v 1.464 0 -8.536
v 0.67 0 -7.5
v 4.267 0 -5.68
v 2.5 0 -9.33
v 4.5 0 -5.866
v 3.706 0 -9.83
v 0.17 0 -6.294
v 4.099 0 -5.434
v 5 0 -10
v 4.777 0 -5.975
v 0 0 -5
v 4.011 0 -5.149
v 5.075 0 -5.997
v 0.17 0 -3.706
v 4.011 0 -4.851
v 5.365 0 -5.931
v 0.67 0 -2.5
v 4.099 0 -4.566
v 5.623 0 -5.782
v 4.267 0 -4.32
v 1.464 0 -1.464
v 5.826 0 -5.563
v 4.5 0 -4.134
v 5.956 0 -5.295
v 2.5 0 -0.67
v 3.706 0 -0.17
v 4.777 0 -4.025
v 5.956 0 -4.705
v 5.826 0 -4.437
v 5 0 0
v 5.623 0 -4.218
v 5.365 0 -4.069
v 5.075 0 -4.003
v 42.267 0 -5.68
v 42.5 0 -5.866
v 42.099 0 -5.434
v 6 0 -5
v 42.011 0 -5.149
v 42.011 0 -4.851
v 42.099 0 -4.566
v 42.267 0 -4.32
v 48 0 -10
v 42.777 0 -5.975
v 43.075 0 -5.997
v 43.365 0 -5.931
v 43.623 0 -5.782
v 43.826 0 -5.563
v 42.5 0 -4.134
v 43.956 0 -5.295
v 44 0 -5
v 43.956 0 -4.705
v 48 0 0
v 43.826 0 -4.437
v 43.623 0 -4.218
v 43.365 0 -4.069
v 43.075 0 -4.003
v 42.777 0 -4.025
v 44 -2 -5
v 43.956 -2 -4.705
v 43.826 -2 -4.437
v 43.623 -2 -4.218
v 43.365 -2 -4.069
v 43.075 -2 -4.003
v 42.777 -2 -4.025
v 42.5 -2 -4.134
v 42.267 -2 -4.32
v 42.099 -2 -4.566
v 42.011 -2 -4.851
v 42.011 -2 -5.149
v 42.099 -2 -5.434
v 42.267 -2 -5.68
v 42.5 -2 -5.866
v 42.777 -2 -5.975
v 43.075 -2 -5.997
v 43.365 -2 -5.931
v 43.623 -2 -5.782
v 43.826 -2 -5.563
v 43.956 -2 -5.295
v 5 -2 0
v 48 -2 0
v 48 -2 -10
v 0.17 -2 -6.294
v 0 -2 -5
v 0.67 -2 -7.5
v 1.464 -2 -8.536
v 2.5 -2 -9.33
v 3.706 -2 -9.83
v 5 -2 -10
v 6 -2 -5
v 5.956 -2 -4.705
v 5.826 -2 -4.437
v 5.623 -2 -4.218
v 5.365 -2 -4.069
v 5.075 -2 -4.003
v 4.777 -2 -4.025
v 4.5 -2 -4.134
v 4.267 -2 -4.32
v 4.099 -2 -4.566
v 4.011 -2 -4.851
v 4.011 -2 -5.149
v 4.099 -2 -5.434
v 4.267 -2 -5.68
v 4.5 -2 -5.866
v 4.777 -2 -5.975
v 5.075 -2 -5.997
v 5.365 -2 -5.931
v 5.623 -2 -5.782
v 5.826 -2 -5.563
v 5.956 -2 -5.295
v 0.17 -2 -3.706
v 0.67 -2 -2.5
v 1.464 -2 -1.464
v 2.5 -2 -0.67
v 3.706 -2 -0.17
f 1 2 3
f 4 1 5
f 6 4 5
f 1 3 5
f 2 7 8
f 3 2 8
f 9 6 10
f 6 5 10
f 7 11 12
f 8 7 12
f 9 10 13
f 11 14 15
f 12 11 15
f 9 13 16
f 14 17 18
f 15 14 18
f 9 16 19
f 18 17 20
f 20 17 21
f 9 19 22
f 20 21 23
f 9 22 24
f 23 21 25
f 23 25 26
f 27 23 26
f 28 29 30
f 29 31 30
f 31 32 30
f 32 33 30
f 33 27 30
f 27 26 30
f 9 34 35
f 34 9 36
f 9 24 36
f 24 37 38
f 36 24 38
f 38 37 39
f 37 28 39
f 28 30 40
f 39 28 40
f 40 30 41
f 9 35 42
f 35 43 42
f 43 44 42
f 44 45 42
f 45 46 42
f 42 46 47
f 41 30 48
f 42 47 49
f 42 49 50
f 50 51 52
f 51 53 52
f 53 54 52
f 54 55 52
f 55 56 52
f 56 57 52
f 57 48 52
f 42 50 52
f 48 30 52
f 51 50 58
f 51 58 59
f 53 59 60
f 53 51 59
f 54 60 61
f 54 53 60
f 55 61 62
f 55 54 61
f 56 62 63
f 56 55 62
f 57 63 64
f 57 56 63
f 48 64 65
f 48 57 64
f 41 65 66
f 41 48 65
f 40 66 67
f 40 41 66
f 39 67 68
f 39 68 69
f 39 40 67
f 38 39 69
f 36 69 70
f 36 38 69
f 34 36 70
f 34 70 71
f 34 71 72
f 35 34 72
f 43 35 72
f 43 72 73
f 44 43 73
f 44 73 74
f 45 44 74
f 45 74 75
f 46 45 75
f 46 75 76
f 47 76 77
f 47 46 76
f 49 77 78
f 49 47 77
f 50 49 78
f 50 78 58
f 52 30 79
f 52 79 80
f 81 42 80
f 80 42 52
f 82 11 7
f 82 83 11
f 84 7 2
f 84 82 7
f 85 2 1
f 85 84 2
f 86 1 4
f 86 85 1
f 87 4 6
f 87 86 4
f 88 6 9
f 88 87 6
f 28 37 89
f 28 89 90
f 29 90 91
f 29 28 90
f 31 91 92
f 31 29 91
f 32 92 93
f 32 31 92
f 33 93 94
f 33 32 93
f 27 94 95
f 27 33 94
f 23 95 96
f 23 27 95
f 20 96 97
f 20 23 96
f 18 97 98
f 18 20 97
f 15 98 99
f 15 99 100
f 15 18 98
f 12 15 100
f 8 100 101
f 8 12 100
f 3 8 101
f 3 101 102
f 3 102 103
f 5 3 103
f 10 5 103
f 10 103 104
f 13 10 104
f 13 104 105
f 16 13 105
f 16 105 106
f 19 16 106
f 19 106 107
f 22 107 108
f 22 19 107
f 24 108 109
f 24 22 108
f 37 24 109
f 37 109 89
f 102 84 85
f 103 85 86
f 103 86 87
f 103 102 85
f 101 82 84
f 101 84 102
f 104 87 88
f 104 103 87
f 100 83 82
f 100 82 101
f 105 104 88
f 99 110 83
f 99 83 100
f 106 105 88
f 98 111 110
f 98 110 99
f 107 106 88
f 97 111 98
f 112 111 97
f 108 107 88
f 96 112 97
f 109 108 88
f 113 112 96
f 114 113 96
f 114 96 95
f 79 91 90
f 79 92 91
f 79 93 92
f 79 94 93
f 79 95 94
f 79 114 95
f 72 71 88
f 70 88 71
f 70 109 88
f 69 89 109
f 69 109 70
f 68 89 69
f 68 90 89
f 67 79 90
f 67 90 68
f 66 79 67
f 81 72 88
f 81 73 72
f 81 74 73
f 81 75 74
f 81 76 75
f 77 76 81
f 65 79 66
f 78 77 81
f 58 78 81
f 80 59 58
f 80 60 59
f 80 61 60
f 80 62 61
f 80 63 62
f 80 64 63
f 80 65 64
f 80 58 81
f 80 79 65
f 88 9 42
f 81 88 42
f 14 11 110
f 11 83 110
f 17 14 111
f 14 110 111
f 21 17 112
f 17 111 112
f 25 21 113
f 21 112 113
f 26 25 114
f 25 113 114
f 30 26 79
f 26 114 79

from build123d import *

# Parameters (mm, degrees)
F0_W     = 48
F0_H     = 10
F0_R     = 1
F1_DEPTH = 2
F2_R     = 4.99999


# Not quite as in the source:
# - a fillet or chamfer is up to 0.001 mm smaller than in the source, because OpenCascade refuses the exact size


with BuildPart() as f1:
    # F0 (on Front) → F1 (new body)
    with BuildSketch(Plane.XZ):
        with Locations((24, -5)):
            Rectangle(F0_W, F0_H)
        with Locations((5, -5)):
            Circle(F0_R, mode=Mode.SUBTRACT)
        with Locations((43, -5)):
            Circle(F0_R, mode=Mode.SUBTRACT)
    extrude(amount=F1_DEPTH)

    # F2 (radius 5 in the source; OpenCascade refuses exactly that, so slightly less here)
    f2_edges = [f1.edges().sort_by_distance(p)[0] for p in [
        (0, -1, 0),
        (0, -1, -10),
    ]]
    fillet(f2_edges, radius=F2_R)


solid = f1.part
